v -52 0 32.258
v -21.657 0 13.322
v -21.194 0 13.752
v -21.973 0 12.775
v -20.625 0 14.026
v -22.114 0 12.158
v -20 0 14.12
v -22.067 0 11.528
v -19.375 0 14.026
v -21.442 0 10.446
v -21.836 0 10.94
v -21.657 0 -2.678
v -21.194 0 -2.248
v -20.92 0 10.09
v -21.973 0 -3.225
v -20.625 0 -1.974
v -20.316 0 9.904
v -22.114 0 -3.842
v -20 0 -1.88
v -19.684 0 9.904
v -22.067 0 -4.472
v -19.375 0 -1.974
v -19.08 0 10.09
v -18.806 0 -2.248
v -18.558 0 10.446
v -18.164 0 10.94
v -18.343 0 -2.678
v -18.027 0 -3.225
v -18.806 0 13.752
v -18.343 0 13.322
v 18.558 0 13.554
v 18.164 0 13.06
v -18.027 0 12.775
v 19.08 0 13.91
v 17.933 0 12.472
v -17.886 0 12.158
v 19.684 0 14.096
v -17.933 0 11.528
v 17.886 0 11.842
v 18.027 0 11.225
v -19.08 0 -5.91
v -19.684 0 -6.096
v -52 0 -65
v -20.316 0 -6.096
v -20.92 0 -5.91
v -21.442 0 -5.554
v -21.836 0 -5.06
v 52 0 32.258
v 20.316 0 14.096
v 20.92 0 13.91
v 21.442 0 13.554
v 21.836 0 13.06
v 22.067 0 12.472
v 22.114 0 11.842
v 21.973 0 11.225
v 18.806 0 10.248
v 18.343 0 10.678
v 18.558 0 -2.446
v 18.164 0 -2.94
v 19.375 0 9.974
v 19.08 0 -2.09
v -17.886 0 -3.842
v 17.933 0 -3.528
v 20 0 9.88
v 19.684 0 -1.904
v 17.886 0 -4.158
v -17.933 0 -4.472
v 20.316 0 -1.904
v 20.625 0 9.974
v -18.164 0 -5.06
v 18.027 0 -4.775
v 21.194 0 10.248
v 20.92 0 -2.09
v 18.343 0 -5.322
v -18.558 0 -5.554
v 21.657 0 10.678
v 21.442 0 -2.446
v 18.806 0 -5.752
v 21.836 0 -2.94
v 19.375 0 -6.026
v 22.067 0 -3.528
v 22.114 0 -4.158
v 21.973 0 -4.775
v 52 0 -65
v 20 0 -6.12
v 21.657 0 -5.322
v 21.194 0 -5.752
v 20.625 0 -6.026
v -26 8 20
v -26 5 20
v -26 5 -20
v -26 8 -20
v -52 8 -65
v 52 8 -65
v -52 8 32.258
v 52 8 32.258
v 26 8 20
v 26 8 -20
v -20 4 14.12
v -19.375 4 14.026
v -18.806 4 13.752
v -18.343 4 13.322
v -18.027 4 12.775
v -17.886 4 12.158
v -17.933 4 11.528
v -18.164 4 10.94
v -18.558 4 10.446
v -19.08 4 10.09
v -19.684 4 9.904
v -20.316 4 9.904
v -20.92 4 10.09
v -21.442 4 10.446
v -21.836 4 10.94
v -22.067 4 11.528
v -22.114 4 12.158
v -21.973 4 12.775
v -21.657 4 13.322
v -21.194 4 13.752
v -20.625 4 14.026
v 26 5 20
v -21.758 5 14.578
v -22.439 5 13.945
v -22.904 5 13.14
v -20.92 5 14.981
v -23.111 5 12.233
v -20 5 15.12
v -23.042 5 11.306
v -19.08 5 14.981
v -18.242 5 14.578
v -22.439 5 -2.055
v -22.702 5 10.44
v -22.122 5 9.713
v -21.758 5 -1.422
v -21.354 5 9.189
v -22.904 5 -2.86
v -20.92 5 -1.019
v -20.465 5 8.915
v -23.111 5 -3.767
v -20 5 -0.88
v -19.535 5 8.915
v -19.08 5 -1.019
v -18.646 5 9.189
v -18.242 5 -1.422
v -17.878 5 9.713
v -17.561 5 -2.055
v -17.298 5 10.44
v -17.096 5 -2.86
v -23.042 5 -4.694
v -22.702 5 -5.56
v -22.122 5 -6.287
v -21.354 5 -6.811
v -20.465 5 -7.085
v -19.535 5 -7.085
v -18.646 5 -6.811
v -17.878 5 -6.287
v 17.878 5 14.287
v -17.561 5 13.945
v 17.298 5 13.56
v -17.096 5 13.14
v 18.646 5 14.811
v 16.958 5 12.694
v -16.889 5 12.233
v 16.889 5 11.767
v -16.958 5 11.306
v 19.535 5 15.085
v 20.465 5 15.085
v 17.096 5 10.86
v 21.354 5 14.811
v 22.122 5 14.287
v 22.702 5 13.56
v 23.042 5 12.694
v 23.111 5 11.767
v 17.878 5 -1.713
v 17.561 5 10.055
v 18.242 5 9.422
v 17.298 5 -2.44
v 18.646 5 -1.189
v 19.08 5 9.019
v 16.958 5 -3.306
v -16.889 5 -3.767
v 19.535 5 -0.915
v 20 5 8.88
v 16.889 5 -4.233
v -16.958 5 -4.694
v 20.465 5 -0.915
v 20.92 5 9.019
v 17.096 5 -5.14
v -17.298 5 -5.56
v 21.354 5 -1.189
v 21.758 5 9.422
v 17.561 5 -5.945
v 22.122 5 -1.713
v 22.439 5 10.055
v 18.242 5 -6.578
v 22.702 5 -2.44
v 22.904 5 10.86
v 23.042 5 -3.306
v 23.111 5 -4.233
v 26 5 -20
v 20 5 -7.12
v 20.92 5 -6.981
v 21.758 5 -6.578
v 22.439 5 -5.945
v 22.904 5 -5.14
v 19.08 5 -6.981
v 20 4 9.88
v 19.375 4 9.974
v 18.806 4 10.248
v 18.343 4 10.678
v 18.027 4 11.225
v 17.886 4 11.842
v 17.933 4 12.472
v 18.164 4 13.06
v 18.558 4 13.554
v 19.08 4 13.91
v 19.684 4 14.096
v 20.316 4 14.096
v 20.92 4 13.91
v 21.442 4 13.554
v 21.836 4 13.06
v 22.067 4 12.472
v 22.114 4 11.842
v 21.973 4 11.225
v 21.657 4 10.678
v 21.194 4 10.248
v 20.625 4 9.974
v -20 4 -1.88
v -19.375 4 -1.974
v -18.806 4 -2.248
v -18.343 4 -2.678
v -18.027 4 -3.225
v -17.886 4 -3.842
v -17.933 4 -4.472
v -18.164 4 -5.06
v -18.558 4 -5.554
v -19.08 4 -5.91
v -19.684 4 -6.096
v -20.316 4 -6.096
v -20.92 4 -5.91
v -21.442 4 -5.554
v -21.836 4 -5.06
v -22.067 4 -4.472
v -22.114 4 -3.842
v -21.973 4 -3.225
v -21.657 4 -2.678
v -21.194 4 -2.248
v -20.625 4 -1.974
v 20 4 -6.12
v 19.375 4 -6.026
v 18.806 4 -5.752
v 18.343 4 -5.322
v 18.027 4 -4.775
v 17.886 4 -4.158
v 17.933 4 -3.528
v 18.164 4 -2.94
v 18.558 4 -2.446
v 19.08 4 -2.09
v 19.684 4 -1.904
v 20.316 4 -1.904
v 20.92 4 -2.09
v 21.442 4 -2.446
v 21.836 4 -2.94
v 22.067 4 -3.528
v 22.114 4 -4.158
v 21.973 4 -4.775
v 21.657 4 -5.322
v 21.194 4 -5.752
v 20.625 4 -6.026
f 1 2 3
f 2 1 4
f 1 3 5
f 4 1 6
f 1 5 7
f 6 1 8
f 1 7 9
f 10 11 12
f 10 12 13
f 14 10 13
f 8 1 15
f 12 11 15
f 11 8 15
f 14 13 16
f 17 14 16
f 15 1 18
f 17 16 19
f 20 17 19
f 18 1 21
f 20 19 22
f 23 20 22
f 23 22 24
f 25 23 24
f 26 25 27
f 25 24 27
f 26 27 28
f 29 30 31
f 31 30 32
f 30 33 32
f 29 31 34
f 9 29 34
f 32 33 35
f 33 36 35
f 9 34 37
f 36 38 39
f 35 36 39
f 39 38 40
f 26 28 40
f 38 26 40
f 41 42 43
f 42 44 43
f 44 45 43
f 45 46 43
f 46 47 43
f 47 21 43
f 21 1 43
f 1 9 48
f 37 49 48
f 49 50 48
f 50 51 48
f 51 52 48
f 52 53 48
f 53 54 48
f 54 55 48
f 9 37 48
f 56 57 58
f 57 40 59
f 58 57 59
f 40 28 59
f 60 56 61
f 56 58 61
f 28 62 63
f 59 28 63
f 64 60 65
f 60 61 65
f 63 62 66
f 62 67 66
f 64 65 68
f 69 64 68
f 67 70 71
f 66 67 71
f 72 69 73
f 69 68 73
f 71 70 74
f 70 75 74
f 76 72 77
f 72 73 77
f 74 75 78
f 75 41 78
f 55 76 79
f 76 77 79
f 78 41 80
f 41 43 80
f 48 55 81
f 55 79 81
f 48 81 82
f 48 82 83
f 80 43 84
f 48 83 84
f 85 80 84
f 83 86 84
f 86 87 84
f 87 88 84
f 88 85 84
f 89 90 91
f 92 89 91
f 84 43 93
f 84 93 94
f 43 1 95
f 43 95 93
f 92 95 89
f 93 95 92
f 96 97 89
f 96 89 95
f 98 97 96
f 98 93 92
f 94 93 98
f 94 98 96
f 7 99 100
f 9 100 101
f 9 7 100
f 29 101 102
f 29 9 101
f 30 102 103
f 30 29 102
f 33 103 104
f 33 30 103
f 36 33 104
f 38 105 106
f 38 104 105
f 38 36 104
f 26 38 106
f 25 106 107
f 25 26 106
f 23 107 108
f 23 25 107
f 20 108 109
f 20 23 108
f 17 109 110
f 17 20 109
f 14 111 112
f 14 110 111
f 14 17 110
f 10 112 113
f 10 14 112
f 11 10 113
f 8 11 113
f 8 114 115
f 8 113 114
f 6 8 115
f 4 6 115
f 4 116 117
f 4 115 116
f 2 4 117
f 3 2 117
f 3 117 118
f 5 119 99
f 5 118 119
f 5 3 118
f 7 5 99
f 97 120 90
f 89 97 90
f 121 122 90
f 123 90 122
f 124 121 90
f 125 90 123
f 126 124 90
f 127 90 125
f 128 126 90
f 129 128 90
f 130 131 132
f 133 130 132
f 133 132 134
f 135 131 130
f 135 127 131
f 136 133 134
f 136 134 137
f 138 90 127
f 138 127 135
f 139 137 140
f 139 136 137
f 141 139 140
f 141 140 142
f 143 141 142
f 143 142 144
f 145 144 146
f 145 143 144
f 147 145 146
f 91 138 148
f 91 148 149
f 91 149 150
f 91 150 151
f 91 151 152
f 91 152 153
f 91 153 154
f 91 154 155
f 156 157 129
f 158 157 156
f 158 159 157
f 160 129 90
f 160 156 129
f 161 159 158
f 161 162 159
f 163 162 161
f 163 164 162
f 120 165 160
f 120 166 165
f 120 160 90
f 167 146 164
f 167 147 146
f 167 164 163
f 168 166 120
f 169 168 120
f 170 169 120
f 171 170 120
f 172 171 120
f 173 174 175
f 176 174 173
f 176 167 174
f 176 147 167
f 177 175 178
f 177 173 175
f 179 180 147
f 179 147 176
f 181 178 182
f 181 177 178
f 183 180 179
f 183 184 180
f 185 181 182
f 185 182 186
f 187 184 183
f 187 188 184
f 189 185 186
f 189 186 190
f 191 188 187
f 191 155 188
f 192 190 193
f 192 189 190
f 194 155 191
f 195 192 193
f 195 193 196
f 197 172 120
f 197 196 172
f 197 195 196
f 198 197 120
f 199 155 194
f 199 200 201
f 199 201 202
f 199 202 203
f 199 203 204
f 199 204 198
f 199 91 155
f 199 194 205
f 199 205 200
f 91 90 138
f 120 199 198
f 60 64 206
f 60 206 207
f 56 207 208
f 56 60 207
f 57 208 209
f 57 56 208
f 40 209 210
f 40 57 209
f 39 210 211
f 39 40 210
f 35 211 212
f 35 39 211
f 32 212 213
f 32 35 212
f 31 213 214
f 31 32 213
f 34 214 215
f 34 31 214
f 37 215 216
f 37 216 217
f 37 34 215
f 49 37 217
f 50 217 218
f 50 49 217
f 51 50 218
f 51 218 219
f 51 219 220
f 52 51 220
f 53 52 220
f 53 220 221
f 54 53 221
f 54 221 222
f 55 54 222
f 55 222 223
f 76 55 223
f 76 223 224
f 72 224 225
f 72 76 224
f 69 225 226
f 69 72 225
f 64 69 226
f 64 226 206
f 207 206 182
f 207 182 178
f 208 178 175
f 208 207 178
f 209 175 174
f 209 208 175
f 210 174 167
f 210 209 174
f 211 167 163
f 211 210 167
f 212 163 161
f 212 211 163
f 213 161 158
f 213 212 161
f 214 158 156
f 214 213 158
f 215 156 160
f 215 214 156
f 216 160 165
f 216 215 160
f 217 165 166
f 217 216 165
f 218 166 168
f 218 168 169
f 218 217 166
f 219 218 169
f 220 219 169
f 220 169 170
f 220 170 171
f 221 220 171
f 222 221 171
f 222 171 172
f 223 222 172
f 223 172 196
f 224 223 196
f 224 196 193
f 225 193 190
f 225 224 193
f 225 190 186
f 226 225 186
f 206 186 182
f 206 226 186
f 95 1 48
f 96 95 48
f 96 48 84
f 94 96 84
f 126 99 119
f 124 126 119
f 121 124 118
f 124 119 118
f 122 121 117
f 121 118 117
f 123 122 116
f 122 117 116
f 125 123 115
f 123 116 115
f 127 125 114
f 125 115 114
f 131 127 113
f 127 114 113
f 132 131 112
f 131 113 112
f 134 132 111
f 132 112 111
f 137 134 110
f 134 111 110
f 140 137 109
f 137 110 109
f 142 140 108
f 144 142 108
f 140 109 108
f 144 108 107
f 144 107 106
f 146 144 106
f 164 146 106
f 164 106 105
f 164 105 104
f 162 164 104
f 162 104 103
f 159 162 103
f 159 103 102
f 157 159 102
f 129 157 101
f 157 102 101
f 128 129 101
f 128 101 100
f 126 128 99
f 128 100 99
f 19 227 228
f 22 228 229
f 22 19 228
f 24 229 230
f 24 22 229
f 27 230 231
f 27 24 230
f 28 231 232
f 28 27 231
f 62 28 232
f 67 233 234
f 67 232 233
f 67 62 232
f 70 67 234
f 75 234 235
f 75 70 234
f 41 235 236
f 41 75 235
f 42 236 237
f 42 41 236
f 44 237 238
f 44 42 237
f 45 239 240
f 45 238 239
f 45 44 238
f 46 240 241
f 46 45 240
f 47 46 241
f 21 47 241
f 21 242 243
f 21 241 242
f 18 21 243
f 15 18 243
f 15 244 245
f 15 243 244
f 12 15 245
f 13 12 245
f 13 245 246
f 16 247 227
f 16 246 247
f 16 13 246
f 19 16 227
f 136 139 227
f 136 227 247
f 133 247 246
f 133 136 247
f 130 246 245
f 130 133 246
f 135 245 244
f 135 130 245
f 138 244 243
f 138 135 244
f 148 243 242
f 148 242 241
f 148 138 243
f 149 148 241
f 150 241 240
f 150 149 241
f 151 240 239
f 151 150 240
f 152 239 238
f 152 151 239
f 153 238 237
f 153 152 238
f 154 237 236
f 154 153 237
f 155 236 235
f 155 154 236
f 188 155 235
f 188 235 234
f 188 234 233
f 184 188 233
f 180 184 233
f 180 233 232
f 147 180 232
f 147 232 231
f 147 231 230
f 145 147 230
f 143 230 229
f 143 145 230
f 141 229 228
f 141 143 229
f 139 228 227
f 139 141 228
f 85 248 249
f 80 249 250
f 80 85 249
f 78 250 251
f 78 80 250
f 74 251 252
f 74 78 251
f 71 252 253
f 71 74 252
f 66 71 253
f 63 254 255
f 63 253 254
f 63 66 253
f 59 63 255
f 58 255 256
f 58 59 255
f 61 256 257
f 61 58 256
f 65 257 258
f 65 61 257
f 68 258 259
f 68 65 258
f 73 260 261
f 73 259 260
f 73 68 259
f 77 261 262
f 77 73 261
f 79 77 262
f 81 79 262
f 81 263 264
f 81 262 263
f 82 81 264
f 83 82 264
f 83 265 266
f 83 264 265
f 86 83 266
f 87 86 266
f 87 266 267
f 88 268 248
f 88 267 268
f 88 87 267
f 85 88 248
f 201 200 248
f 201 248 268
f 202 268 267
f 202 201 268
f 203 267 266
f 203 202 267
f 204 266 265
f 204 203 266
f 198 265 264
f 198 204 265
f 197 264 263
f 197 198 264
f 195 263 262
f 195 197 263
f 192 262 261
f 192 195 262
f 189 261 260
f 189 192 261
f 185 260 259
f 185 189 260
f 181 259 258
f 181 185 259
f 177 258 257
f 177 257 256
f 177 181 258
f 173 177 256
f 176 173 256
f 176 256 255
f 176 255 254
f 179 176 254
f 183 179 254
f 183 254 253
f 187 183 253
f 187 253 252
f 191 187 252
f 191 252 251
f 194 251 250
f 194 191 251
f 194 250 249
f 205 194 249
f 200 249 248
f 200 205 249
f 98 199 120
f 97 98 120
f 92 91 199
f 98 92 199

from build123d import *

# Parameters (mm, degrees)
SKETCH1_W            = 52
SKETCH1_H            = 40
SKETCH1_R            = 2.75
BOSS_EXTRUDE10_DEPTH = 5
SKETCH1_21_R         = 2.75
BOSS_EXTRUDE13_DEPTH = 5
SKETCH1_22_R         = 2.12
CUT_EXTRUDE4_DEPTH   = 7
CHAMFER1_SIZE        = 1
SKETCH1_23_R         = 2.75
BOSS_EXTRUDE14_DEPTH = 5
SKETCH1_24_R         = 2.12
CUT_EXTRUDE6_DEPTH   = 5
SKETCH1_25_R         = 2.75
BOSS_EXTRUDE15_DEPTH = 5
SKETCH1_26_R         = 2.12
CUT_EXTRUDE7_DEPTH   = 18
SKETCH1_29_R         = 2.75
BOSS_EXTRUDE17_DEPTH = 5
SKETCH1_30_R         = 2.12
CUT_EXTRUDE9_DEPTH   = 14
CHAMFER3_SIZE        = 1
CHAMFER4_SIZE        = 1
CHAMFER5_SIZE        = 1
SKETCH5_W            = 104
SKETCH5_H            = 97.258090947
BOSS_EXTRUDE19_DEPTH = 8


with BuildPart() as part:
    # Sketch1 → Boss-Extrude10 (new body)
    with BuildSketch(Plane(origin=(0, 0, 0), x_dir=(1, 0, 0), z_dir=(0, 1, 0))):
        Rectangle(SKETCH1_W, SKETCH1_H)
        with Locations((-20, -12)):
            Circle(SKETCH1_R, mode=Mode.SUBTRACT)
        with Locations((20, -12)):
            Circle(SKETCH1_R, mode=Mode.SUBTRACT)
        with Locations((-20, 4)):
            Circle(SKETCH1_R, mode=Mode.SUBTRACT)
        with Locations((20, 4)):
            Circle(SKETCH1_R, mode=Mode.SUBTRACT)
    extrude(amount=BOSS_EXTRUDE10_DEPTH)

    # Sketch1<21> → Boss-Extrude13 (add)
    with BuildSketch(Plane(origin=(0, 0, 0), x_dir=(1, 0, 0), z_dir=(0, 1, 0))):
        with Locations((20, 4)):
            Circle(SKETCH1_21_R)
    extrude(amount=BOSS_EXTRUDE13_DEPTH)

    # Sketch1<22> → Cut-Extrude4 (cut)
    with BuildSketch(Plane(origin=(0, 0, 0), x_dir=(1, 0, 0), z_dir=(0, 1, 0))):
        with Locations((20, 4)):
            Circle(SKETCH1_22_R)
    extrude(amount=CUT_EXTRUDE4_DEPTH, mode=Mode.SUBTRACT)

    # Chamfer1
    chamfer1_edges = [part.edges().sort_by_distance(p)[0] for p in [
        (17.88, 5, -4),
    ]]
    chamfer(chamfer1_edges, length=CHAMFER1_SIZE)

    # Sketch1<23> → Boss-Extrude14 (add)
    with BuildSketch(Plane(origin=(0, 0, 0), x_dir=(1, 0, 0), z_dir=(0, 1, 0))):
        with Locations((20, -12)):
            Circle(SKETCH1_23_R)
    extrude(amount=BOSS_EXTRUDE14_DEPTH)

    # Sketch1<24> → Cut-Extrude6 (cut)
    with BuildSketch(Plane(origin=(0, 0, 0), x_dir=(1, 0, 0), z_dir=(0, 1, 0))):
        with Locations((20, -12)):
            Circle(SKETCH1_24_R)
    extrude(amount=CUT_EXTRUDE6_DEPTH, mode=Mode.SUBTRACT)

    # Sketch1<25> → Boss-Extrude15 (add)
    with BuildSketch(Plane(origin=(0, 0, 0), x_dir=(1, 0, 0), z_dir=(0, 1, 0))):
        with Locations((-20, -12)):
            Circle(SKETCH1_25_R)
    extrude(amount=BOSS_EXTRUDE15_DEPTH)

    # Sketch1<26> → Cut-Extrude7 (cut)
    with BuildSketch(Plane(origin=(0, 0, 0), x_dir=(1, 0, 0), z_dir=(0, 1, 0))):
        with Locations((-20, -12)):
            Circle(SKETCH1_26_R)
    extrude(amount=CUT_EXTRUDE7_DEPTH, mode=Mode.SUBTRACT)

    # Sketch1<29> → Boss-Extrude17 (add)
    with BuildSketch(Plane(origin=(0, 0, 0), x_dir=(1, 0, 0), z_dir=(0, 1, 0))):
        with Locations((-20, 4)):
            Circle(SKETCH1_29_R)
    extrude(amount=BOSS_EXTRUDE17_DEPTH)

    # Sketch1<30> → Cut-Extrude9 (cut)
    with BuildSketch(Plane(origin=(0, 0, 0), x_dir=(1, 0, 0), z_dir=(0, 1, 0))):
        with Locations((-20, 4)):
            Circle(SKETCH1_30_R)
    extrude(amount=CUT_EXTRUDE9_DEPTH, mode=Mode.SUBTRACT)

    # Chamfer3
    chamfer3_edges = [part.edges().sort_by_distance(p)[0] for p in [
        (-22.12, 5, -4),
    ]]
    chamfer(chamfer3_edges, length=CHAMFER3_SIZE)

    # Chamfer4
    chamfer4_edges = [part.edges().sort_by_distance(p)[0] for p in [
        (-22.12, 5, 12),
    ]]
    chamfer(chamfer4_edges, length=CHAMFER4_SIZE)

    # Chamfer5
    chamfer5_edges = [part.edges().sort_by_distance(p)[0] for p in [
        (17.88, 5, 12),
    ]]
    chamfer(chamfer5_edges, length=CHAMFER5_SIZE)

    # Sketch5 → Boss-Extrude19 (add)
    with BuildSketch(Plane(origin=(0, 0, 0), x_dir=(1, 0, 0), z_dir=(0, 1, 0))):
        with Locations((0, 16.370954527)):
            Rectangle(SKETCH5_W, SKETCH5_H)
        Polygon((26, -20), (-26, -20), (-26, 20), (0, 20), (26, 20), align=None, mode=Mode.SUBTRACT)
    extrude(amount=BOSS_EXTRUDE19_DEPTH)


solid = part.part
